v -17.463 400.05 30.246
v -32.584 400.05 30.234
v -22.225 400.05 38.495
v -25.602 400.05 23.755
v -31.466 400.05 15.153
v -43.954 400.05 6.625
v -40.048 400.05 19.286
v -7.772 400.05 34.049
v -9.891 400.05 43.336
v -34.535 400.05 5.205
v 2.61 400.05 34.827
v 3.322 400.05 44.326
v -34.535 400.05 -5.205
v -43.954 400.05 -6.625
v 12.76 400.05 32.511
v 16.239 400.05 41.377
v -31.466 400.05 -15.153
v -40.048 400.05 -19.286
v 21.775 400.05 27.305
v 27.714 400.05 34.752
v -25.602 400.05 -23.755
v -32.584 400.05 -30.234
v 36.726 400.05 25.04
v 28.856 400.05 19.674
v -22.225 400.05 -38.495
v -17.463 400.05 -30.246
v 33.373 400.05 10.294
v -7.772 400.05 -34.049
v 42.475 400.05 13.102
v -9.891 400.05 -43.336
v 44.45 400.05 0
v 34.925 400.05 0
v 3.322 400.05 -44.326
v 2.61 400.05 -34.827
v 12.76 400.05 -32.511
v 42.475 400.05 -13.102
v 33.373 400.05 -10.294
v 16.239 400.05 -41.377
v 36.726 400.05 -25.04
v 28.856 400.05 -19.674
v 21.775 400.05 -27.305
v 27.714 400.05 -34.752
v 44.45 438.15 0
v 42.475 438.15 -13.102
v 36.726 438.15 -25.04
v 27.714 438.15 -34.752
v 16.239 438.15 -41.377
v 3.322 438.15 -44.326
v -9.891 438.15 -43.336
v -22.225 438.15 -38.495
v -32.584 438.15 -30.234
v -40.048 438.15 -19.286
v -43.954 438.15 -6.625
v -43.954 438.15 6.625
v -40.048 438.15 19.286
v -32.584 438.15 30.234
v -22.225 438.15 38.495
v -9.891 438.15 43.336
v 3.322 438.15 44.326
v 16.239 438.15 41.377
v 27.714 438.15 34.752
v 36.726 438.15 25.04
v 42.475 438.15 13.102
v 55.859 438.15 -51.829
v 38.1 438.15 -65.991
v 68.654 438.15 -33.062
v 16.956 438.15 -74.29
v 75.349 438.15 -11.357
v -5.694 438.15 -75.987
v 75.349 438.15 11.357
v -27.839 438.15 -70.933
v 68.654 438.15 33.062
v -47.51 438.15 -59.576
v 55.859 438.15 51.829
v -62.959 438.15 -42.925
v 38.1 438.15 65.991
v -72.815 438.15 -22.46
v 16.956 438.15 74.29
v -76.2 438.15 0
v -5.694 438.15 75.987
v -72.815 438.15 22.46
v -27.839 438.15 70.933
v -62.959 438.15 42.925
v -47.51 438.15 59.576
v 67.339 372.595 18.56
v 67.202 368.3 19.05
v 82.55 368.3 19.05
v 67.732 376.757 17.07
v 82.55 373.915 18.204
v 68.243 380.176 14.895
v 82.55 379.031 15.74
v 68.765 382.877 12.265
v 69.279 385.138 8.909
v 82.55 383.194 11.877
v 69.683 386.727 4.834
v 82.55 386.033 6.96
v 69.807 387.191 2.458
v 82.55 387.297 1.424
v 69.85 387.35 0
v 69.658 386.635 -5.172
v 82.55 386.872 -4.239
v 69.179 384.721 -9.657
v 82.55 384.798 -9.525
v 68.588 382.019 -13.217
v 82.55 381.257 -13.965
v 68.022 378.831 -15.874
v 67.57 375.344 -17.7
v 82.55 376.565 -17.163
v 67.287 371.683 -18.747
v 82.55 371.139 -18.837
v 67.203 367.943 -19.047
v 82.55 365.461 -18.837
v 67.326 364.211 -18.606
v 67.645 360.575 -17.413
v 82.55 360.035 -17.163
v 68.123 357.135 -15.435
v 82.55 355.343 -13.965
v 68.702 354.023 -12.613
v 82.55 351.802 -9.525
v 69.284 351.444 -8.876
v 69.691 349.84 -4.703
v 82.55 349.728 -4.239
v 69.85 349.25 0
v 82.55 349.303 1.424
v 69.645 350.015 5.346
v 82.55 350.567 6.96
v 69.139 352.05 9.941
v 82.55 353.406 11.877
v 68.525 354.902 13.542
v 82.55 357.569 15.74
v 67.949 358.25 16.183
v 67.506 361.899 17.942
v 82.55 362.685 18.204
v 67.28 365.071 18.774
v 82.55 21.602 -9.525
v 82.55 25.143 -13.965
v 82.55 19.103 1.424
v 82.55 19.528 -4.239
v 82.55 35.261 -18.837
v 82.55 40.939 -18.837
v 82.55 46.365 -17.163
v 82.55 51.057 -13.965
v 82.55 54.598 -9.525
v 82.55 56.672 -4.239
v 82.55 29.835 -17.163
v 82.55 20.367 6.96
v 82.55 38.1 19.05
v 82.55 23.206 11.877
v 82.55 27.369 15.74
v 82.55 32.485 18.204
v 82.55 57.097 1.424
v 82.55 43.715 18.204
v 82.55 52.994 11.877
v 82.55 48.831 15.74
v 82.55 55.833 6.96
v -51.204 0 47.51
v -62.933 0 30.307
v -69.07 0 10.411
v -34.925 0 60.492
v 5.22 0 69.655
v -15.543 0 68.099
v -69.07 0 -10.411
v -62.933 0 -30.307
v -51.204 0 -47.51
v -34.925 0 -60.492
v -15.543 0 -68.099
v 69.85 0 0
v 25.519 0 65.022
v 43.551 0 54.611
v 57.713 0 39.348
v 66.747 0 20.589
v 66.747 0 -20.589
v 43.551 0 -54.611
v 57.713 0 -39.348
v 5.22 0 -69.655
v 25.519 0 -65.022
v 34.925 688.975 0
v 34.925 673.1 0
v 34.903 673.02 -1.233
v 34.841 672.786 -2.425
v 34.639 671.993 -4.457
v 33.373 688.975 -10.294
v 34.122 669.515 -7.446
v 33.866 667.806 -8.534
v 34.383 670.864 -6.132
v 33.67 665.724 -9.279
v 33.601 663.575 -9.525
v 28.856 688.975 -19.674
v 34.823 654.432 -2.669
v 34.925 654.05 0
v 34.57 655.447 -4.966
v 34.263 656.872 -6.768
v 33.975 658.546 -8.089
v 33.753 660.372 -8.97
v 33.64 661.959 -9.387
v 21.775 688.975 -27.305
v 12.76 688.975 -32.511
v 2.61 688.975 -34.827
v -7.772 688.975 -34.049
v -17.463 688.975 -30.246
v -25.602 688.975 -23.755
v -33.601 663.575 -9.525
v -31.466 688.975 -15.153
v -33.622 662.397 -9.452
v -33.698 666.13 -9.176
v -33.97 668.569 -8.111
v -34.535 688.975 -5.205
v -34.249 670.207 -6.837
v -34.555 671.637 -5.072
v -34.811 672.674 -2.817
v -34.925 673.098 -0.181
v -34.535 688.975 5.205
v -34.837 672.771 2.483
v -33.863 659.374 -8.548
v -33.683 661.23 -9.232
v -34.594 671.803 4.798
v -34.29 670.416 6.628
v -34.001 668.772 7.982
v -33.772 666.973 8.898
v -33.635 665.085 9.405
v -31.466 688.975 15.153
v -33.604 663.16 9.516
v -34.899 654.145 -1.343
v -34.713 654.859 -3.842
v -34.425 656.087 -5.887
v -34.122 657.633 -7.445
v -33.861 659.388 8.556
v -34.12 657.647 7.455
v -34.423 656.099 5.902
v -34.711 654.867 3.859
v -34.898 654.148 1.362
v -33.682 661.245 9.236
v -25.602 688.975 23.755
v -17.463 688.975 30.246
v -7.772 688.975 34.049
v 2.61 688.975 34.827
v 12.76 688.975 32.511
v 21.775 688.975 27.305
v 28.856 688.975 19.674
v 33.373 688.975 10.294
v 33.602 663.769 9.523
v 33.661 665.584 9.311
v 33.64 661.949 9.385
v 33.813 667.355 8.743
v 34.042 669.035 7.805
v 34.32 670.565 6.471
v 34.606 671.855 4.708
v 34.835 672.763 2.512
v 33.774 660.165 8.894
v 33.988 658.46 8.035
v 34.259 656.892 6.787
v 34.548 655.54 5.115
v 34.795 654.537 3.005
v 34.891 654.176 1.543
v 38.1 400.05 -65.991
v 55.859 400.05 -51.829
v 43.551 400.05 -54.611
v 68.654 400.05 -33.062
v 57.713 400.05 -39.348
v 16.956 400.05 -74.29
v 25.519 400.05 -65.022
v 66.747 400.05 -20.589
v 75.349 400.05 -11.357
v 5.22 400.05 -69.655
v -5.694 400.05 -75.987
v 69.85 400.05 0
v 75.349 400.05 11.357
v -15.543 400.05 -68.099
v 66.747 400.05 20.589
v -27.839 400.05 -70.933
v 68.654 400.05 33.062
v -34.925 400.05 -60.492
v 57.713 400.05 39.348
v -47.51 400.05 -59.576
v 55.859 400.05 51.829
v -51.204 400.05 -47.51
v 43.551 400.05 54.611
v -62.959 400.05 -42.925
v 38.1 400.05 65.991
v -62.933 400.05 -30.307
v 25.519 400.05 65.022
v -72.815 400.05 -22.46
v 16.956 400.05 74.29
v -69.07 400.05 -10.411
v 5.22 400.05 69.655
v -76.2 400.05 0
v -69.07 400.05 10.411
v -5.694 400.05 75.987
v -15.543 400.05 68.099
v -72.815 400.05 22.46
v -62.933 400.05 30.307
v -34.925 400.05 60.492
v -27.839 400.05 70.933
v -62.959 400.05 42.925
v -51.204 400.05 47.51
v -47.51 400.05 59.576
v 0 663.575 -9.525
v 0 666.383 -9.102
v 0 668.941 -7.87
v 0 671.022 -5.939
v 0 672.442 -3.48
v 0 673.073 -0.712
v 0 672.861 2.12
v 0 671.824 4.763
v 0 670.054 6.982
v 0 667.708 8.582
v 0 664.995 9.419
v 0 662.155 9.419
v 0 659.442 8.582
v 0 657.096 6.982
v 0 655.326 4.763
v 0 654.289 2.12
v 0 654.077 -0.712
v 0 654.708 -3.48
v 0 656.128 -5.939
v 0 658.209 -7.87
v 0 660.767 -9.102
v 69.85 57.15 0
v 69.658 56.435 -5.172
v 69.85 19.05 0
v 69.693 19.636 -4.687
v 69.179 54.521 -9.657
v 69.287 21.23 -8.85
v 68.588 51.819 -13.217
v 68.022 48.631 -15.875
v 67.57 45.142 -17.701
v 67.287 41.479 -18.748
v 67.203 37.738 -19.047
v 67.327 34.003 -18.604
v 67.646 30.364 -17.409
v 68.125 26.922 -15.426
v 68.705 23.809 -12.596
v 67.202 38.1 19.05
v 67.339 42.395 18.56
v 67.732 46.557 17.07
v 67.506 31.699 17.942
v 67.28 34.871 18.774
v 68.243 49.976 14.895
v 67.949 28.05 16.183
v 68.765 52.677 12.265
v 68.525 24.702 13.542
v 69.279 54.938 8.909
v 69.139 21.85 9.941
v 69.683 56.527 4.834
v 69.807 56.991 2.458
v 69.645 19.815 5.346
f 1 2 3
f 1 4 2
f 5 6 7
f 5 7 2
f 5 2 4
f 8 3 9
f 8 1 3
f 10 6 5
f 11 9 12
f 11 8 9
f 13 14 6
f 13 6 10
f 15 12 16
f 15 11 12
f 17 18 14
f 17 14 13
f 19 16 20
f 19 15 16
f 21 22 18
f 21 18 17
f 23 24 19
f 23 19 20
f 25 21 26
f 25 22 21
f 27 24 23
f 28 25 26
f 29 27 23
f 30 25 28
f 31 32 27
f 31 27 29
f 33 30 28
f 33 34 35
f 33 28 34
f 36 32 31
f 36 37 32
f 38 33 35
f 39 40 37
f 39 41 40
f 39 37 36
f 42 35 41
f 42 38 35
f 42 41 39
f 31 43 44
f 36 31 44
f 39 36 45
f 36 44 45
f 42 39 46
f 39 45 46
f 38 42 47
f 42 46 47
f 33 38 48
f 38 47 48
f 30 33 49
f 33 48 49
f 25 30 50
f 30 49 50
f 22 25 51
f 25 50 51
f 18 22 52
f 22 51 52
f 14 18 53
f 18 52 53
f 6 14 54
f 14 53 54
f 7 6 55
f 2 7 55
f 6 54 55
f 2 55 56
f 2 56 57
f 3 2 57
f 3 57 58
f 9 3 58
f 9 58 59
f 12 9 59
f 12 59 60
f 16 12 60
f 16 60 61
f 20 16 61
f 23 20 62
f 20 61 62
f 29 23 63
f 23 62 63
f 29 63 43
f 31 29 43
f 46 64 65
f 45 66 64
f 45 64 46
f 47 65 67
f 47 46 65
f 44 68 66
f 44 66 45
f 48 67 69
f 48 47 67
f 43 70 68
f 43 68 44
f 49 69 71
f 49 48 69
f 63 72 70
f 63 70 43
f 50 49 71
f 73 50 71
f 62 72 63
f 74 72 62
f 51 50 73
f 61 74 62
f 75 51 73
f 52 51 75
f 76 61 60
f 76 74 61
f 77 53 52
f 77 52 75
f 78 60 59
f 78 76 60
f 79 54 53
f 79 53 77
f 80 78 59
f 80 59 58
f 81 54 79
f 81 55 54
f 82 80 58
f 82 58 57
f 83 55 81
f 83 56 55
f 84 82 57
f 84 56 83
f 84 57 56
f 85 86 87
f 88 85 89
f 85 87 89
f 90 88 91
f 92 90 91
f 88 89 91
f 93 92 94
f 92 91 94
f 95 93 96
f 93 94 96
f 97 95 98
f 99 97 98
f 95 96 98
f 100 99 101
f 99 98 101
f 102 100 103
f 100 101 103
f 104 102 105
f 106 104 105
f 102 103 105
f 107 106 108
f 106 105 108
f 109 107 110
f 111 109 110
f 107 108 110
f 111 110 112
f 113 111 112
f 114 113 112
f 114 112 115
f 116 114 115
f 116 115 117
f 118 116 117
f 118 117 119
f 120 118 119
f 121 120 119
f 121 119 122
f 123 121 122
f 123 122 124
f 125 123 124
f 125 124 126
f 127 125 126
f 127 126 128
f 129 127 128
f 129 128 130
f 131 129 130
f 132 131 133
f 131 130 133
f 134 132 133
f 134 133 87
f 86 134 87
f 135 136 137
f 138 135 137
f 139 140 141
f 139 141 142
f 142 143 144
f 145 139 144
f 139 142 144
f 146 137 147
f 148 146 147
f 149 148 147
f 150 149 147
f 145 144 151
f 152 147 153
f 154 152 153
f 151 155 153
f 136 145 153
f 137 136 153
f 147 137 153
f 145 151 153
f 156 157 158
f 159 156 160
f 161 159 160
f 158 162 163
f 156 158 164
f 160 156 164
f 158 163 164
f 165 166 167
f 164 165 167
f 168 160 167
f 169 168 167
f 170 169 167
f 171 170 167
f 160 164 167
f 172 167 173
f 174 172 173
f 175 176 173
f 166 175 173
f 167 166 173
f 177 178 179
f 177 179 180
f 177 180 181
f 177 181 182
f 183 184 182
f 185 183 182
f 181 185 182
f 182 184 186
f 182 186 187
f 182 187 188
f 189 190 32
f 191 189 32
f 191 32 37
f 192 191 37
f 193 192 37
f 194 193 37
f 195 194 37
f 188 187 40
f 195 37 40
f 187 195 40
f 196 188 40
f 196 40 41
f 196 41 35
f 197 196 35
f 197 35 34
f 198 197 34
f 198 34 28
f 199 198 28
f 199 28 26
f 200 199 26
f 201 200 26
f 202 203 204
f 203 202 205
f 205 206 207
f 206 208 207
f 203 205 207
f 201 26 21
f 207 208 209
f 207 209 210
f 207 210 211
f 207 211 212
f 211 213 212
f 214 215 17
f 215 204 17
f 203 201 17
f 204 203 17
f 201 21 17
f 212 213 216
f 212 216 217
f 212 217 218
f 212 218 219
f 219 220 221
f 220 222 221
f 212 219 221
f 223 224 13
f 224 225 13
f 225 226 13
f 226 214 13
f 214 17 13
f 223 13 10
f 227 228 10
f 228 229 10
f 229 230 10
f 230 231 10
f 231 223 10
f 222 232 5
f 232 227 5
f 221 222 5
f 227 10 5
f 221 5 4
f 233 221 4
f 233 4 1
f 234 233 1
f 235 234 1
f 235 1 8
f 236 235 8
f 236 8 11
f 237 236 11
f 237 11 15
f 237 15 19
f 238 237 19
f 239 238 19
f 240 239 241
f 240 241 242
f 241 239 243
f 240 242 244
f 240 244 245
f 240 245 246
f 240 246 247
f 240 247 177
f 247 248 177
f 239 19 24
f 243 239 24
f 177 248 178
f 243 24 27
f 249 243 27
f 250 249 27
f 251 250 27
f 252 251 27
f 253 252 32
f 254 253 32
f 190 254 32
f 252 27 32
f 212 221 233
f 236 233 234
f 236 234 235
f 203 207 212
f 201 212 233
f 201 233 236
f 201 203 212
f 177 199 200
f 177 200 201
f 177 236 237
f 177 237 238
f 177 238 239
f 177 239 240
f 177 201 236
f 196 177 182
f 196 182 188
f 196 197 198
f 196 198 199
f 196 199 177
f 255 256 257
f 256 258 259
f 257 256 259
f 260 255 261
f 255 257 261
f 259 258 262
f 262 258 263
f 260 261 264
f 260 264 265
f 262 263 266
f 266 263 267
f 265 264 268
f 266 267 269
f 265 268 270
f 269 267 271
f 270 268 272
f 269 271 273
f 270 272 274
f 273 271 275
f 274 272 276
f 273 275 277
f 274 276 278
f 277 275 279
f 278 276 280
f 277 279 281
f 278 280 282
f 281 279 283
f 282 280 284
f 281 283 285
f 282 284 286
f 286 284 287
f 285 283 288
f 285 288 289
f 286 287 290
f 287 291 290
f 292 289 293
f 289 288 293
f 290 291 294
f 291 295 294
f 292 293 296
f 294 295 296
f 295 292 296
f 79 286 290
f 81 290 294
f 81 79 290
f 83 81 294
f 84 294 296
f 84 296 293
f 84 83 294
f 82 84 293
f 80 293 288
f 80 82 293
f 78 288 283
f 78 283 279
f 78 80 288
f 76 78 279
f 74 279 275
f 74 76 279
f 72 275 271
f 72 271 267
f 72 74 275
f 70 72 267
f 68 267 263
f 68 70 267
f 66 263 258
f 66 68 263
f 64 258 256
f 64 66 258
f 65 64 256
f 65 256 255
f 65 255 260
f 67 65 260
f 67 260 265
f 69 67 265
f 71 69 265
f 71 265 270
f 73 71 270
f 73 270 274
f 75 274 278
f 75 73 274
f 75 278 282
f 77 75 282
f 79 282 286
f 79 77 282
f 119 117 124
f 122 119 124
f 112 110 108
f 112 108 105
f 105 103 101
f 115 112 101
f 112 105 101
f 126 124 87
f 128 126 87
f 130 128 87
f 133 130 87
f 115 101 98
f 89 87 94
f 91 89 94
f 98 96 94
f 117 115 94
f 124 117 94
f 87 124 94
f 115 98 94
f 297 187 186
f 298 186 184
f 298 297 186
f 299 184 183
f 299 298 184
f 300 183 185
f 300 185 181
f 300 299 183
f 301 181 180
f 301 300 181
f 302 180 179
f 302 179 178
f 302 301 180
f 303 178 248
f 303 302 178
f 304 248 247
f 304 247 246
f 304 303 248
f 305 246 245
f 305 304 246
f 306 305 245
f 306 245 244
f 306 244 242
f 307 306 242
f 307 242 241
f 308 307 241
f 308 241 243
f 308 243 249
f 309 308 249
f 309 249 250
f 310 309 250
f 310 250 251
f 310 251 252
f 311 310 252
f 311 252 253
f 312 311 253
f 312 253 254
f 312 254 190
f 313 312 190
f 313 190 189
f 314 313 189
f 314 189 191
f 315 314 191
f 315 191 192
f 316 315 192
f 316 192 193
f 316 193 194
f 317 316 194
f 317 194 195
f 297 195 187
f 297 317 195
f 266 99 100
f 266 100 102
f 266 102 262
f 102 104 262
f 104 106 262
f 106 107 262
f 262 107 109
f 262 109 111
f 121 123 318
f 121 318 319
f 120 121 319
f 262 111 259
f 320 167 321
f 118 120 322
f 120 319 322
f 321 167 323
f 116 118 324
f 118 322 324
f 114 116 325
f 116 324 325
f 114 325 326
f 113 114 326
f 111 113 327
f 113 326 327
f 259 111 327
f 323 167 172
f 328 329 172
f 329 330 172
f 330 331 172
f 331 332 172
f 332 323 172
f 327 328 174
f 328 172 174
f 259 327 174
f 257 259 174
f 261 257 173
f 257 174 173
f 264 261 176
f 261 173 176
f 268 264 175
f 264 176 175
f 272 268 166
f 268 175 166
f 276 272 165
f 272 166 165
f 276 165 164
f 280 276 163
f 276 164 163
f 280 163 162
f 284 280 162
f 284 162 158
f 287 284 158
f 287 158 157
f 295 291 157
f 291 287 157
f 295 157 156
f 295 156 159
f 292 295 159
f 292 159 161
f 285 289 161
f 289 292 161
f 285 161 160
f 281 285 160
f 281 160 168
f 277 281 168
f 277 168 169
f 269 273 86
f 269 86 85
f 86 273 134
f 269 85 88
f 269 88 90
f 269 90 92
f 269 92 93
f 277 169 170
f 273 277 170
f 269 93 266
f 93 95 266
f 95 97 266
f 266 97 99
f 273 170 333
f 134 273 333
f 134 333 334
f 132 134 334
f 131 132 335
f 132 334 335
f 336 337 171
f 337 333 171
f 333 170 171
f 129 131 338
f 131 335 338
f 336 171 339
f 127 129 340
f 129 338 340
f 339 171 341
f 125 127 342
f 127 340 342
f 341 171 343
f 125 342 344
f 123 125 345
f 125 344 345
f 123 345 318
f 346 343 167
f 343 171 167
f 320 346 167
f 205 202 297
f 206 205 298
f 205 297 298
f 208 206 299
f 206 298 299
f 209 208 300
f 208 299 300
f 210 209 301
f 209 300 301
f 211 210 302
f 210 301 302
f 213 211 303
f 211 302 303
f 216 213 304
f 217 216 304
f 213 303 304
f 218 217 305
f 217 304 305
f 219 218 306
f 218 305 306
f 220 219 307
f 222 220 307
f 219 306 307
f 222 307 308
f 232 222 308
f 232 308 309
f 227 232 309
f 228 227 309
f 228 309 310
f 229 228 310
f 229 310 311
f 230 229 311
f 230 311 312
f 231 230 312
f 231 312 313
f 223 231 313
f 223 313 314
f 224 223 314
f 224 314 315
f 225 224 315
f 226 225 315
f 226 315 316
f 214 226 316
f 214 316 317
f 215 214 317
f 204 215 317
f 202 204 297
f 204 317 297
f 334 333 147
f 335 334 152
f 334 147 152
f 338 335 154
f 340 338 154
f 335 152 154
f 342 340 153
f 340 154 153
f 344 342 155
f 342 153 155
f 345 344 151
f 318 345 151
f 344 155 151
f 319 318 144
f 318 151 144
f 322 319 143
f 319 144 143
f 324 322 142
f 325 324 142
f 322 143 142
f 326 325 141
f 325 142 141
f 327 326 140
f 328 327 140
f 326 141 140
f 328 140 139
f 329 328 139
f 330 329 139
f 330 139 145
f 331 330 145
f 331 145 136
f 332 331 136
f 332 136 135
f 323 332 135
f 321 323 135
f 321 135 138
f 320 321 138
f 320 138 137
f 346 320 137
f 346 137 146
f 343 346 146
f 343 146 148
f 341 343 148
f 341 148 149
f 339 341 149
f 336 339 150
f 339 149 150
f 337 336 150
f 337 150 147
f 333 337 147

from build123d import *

# Parameters (mm, degrees)
SKETCH1_R               = 69.85
BOSS_EXTRUDE1_DEPTH     = 438.15
SKETCH5_R               = 76.2
BOSS_EXTRUDE5_DEPTH     = 38.1
SKETCH6_R               = 44.45
CUT_EXTRUDE1_DEPTH      = 38.1
BOSS_EXTRUDE7_START     = -12.7
SKETCH8_R               = 19.05
BOSS_EXTRUDE7_DEPTH     = 15.347917
SKETCH9_R               = 34.925
BOSS_EXTRUDE8_DEPTH     = 288.925
SKETCH10_R              = 9.525
CUT_EXTRUDE2_DEPTH      = 83.5500001
CUT_EXTRUDE2_DEPTH_BACK = 77.2


with BuildPart() as part:
    # Sketch1 → Boss-Extrude1 (new body)
    with BuildSketch(Plane(origin=(0, 0, 0), x_dir=(1, 0, 0), z_dir=(0, 1, 0))):
        Circle(SKETCH1_R)
    extrude(amount=BOSS_EXTRUDE1_DEPTH)

    # Sketch5 → Boss-Extrude5 (add)
    with BuildSketch(Plane(origin=(0, 438.15, 0), x_dir=(-1, 0, 0), z_dir=(0, 1, 0))):
        Circle(SKETCH5_R)
    extrude(amount=-BOSS_EXTRUDE5_DEPTH)

    # Sketch6 → Cut-Extrude1 (cut)
    with BuildSketch(Plane(origin=(0, 438.15, 0), x_dir=(1, 0, 0), z_dir=(0, 1, 0))):
        Circle(SKETCH6_R)
    extrude(amount=-CUT_EXTRUDE1_DEPTH, mode=Mode.SUBTRACT)

    # Sketch8 → Boss-Extrude7 (add)
    with BuildSketch(Plane.ZY.offset(-69.85).offset(BOSS_EXTRUDE7_START)):
        with Locations((0, 368.3)):
            Circle(SKETCH8_R)
        with Locations((0, 38.1)):
            Circle(SKETCH8_R)
    extrude(amount=BOSS_EXTRUDE7_DEPTH)

    # Sketch9 → Boss-Extrude8 (add)
    with BuildSketch(Plane(origin=(0, 400.05, 0), x_dir=(1, 0, 0), z_dir=(0, 1, 0))):
        Circle(SKETCH9_R)
    extrude(amount=BOSS_EXTRUDE8_DEPTH)

    # Sketch10 → Cut-Extrude2 (cut, two sides)
    with BuildSketch(Plane(origin=(0, 0, 0), x_dir=(0, 0, -1), z_dir=(1, 0, 0))) as cut_extrude2_sk:
        with Locations((0, 663.575)):
            Circle(SKETCH10_R)
    extrude(amount=CUT_EXTRUDE2_DEPTH, mode=Mode.SUBTRACT)
    extrude(cut_extrude2_sk.sketch, amount=-CUT_EXTRUDE2_DEPTH_BACK, mode=Mode.SUBTRACT)


solid = part.part
